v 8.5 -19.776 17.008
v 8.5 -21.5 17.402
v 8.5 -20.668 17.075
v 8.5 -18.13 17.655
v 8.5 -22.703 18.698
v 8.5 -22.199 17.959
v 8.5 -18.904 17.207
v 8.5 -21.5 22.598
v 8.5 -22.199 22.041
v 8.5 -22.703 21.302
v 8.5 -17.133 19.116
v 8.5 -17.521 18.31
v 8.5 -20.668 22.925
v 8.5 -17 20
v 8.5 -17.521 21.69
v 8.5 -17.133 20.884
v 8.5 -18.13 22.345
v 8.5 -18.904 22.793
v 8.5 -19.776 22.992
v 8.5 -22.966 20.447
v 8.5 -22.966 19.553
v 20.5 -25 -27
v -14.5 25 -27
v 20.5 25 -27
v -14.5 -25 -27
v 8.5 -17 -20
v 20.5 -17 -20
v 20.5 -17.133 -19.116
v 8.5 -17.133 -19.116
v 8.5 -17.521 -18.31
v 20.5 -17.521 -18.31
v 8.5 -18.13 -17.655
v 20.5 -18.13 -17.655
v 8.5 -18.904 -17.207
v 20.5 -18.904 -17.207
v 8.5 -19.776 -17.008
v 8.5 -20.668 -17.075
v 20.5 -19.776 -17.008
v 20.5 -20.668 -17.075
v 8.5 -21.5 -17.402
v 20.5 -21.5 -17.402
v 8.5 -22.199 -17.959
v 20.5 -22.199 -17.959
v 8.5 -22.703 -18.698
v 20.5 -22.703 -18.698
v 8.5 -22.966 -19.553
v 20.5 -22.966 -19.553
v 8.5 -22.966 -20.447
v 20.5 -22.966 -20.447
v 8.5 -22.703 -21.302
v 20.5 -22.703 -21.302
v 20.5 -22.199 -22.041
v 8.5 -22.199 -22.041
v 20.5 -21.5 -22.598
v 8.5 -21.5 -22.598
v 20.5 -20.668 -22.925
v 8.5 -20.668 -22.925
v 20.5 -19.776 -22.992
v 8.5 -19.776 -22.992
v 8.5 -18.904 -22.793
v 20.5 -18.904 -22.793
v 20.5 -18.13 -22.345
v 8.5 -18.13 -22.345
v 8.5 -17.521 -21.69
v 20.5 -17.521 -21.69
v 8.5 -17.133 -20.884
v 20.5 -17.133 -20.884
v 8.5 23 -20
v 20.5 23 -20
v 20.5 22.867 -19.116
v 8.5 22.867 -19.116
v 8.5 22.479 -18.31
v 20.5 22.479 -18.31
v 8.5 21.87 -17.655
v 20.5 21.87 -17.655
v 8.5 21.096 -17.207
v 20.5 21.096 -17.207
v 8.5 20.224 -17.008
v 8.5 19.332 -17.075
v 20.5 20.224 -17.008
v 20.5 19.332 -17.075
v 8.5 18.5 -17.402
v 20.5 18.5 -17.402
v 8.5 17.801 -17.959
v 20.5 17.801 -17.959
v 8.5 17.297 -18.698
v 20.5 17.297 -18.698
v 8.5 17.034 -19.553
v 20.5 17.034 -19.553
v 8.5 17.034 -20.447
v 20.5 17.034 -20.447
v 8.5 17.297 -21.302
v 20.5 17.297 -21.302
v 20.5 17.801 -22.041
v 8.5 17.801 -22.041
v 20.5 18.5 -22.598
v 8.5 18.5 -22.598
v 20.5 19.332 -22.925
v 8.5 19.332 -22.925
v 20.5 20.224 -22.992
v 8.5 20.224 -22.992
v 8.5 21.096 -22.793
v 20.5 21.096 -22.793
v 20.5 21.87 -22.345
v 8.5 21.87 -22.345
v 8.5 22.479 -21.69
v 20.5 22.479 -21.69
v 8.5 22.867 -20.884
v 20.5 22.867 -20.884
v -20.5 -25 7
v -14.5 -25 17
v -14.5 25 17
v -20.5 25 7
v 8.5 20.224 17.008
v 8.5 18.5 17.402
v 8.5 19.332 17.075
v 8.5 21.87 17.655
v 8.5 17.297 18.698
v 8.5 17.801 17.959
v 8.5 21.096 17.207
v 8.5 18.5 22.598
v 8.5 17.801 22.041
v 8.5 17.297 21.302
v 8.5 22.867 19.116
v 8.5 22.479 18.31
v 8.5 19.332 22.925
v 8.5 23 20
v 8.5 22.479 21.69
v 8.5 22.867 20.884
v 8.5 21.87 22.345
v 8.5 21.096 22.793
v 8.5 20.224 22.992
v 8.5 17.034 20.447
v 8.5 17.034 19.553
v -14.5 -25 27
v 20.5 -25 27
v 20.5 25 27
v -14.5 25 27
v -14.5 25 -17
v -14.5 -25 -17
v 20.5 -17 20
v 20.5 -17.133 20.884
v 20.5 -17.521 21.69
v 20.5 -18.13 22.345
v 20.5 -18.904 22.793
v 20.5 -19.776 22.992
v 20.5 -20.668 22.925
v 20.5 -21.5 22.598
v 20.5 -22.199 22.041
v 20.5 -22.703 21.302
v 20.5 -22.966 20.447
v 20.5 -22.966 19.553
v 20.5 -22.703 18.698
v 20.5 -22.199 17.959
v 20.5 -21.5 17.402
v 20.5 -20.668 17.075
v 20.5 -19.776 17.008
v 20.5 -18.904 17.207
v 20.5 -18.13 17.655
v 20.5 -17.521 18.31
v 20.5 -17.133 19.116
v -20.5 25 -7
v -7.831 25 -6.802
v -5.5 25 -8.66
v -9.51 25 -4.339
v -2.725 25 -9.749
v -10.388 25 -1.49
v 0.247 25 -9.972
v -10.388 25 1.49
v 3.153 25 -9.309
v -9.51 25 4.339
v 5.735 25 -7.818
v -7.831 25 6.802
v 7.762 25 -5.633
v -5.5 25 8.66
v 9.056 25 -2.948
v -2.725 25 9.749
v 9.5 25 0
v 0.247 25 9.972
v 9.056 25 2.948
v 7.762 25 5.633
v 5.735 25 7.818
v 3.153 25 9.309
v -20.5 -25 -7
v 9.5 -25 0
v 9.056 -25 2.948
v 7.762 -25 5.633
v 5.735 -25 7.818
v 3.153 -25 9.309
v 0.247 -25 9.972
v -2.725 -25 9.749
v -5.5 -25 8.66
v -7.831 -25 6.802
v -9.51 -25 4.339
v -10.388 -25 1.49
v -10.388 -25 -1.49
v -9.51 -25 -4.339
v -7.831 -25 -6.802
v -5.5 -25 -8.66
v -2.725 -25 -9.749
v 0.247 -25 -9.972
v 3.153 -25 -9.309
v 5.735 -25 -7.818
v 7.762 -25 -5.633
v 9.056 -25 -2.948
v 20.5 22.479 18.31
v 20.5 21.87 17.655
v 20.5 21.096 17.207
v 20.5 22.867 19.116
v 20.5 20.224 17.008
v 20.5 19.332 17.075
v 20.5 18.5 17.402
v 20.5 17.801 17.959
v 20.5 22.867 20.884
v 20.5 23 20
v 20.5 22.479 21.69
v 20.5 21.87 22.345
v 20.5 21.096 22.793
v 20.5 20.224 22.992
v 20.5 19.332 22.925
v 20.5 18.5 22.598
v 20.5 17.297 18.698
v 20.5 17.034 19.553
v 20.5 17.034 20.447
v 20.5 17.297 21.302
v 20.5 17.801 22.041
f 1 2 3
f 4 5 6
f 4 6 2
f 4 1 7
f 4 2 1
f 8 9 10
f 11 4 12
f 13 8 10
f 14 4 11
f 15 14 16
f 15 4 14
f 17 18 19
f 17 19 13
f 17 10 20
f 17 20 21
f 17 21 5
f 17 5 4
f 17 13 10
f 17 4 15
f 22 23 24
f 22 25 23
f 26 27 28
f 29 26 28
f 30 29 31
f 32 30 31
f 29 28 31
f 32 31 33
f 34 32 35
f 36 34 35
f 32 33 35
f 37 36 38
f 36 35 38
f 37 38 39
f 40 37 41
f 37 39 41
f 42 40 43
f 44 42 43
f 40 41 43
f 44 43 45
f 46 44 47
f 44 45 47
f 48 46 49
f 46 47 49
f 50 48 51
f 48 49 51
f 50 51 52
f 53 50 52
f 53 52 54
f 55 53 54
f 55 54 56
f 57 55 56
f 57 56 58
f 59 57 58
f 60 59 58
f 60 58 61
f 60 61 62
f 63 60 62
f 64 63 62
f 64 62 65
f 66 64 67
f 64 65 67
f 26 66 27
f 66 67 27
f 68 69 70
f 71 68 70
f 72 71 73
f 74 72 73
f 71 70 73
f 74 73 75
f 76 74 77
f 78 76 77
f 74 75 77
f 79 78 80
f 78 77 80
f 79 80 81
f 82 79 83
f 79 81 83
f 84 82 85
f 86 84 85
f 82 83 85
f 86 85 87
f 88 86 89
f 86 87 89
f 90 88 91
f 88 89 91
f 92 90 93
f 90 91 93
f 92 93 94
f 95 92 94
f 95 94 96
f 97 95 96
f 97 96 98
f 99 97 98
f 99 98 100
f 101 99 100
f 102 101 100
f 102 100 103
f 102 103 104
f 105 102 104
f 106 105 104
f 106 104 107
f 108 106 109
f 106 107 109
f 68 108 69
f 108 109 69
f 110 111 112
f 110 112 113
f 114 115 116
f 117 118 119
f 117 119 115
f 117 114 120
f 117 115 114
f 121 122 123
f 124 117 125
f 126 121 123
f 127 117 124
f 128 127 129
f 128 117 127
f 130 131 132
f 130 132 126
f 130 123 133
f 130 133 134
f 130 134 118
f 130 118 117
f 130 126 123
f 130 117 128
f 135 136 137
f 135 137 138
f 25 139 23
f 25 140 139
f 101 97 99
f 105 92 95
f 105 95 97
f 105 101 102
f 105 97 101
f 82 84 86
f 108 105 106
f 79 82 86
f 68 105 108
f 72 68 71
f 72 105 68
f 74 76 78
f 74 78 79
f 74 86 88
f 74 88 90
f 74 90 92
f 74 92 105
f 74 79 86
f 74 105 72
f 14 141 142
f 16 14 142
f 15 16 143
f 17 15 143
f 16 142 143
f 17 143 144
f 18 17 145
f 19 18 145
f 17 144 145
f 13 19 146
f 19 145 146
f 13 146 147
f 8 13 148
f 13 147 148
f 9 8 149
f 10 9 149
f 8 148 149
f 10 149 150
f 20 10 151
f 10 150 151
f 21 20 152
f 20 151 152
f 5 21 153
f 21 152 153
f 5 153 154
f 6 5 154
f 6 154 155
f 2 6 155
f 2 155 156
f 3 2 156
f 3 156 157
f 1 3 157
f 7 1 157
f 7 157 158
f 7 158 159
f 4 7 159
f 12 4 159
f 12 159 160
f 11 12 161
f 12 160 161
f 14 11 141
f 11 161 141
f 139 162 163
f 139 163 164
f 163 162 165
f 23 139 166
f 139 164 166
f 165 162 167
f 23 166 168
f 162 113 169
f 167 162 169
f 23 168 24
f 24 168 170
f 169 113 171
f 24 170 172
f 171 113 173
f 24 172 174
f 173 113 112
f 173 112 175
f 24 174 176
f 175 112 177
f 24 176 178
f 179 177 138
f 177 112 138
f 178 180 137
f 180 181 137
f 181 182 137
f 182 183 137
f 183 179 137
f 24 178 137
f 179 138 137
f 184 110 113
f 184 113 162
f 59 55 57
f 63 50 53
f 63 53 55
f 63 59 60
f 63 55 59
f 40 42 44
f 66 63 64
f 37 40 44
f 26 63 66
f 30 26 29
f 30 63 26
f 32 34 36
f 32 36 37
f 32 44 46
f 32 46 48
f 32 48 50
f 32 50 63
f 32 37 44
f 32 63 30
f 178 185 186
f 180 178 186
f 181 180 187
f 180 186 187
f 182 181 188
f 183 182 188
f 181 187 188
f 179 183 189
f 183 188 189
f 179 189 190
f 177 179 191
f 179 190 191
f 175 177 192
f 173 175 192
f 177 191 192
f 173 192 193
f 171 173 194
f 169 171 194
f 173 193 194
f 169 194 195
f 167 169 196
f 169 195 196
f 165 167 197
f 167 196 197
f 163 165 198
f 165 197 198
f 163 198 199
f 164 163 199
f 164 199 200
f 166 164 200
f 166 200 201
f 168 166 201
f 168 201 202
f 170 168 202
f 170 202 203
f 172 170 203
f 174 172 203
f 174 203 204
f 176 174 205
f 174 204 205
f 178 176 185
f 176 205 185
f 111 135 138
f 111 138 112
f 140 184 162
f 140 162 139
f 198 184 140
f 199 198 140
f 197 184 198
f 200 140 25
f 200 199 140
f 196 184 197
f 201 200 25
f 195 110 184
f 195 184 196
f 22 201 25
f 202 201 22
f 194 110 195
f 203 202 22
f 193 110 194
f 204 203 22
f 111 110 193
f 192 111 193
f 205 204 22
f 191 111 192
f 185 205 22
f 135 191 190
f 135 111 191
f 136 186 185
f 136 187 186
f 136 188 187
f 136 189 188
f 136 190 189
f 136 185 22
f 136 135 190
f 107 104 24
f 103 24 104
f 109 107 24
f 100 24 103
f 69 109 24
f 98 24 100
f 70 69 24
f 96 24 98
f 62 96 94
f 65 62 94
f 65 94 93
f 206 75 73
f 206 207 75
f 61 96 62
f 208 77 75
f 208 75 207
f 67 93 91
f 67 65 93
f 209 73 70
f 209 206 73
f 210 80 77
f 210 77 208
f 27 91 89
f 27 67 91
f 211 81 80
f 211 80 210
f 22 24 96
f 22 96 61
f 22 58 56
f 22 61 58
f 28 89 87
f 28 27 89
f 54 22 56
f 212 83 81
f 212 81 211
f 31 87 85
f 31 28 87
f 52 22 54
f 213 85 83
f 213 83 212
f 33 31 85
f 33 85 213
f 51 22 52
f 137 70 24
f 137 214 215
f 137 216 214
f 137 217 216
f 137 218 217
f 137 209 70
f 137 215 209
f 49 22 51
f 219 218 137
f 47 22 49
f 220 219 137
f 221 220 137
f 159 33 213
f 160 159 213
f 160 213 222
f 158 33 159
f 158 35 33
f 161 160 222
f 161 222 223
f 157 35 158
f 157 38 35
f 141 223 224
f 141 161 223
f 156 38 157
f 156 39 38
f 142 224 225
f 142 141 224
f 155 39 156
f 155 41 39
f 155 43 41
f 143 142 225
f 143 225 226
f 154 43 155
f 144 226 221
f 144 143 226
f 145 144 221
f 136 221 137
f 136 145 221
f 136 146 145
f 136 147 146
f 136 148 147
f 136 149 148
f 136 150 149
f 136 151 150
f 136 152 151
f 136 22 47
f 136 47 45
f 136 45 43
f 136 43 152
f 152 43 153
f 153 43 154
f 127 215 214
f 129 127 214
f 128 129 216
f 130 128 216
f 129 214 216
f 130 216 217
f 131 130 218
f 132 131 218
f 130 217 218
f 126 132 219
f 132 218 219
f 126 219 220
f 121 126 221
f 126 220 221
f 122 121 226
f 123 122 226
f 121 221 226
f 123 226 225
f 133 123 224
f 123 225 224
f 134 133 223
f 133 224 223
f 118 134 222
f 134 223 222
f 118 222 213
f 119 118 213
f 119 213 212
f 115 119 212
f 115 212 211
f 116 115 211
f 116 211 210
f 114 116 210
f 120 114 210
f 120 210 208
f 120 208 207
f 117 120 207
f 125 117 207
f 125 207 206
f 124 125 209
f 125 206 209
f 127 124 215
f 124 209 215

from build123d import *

# Parameters (mm, degrees)
F1_DEPTH = 25
F2_R     = 10
F3_DEPTH = 50
F4_R     = 3
F5_DEPTH = 12


with BuildPart() as f1:
    # F0 (on Front) → F1 (new body, symmetric)
    with BuildSketch(Plane.XZ):
        Polygon((20.5, -27), (20.5, 27), (-14.5, 27), (-14.5, 17), (-20.5, 7), (-20.5, -7), (-14.5, -17), (-14.5, -27), align=None)
    extrude(amount=F1_DEPTH, both=True)

    # F2 (on face) → F3 (cut)
    with BuildSketch(Plane.XZ.offset(25)):
        with Locations((-0.5, 0)):
            Circle(F2_R)
    extrude(amount=-F3_DEPTH, mode=Mode.SUBTRACT)

    # F4 (on face) → F5 (cut)
    with BuildSketch(Plane.YZ.offset(20.5)):
        with Locations((-20, 20)):
            Circle(F4_R)
        with Locations((20, 20)):
            Circle(F4_R)
        with Locations((20, -20)):
            Circle(F4_R)
        with Locations((-20, -20)):
            Circle(F4_R)
    extrude(amount=-F5_DEPTH, mode=Mode.SUBTRACT)


solid = f1.part
